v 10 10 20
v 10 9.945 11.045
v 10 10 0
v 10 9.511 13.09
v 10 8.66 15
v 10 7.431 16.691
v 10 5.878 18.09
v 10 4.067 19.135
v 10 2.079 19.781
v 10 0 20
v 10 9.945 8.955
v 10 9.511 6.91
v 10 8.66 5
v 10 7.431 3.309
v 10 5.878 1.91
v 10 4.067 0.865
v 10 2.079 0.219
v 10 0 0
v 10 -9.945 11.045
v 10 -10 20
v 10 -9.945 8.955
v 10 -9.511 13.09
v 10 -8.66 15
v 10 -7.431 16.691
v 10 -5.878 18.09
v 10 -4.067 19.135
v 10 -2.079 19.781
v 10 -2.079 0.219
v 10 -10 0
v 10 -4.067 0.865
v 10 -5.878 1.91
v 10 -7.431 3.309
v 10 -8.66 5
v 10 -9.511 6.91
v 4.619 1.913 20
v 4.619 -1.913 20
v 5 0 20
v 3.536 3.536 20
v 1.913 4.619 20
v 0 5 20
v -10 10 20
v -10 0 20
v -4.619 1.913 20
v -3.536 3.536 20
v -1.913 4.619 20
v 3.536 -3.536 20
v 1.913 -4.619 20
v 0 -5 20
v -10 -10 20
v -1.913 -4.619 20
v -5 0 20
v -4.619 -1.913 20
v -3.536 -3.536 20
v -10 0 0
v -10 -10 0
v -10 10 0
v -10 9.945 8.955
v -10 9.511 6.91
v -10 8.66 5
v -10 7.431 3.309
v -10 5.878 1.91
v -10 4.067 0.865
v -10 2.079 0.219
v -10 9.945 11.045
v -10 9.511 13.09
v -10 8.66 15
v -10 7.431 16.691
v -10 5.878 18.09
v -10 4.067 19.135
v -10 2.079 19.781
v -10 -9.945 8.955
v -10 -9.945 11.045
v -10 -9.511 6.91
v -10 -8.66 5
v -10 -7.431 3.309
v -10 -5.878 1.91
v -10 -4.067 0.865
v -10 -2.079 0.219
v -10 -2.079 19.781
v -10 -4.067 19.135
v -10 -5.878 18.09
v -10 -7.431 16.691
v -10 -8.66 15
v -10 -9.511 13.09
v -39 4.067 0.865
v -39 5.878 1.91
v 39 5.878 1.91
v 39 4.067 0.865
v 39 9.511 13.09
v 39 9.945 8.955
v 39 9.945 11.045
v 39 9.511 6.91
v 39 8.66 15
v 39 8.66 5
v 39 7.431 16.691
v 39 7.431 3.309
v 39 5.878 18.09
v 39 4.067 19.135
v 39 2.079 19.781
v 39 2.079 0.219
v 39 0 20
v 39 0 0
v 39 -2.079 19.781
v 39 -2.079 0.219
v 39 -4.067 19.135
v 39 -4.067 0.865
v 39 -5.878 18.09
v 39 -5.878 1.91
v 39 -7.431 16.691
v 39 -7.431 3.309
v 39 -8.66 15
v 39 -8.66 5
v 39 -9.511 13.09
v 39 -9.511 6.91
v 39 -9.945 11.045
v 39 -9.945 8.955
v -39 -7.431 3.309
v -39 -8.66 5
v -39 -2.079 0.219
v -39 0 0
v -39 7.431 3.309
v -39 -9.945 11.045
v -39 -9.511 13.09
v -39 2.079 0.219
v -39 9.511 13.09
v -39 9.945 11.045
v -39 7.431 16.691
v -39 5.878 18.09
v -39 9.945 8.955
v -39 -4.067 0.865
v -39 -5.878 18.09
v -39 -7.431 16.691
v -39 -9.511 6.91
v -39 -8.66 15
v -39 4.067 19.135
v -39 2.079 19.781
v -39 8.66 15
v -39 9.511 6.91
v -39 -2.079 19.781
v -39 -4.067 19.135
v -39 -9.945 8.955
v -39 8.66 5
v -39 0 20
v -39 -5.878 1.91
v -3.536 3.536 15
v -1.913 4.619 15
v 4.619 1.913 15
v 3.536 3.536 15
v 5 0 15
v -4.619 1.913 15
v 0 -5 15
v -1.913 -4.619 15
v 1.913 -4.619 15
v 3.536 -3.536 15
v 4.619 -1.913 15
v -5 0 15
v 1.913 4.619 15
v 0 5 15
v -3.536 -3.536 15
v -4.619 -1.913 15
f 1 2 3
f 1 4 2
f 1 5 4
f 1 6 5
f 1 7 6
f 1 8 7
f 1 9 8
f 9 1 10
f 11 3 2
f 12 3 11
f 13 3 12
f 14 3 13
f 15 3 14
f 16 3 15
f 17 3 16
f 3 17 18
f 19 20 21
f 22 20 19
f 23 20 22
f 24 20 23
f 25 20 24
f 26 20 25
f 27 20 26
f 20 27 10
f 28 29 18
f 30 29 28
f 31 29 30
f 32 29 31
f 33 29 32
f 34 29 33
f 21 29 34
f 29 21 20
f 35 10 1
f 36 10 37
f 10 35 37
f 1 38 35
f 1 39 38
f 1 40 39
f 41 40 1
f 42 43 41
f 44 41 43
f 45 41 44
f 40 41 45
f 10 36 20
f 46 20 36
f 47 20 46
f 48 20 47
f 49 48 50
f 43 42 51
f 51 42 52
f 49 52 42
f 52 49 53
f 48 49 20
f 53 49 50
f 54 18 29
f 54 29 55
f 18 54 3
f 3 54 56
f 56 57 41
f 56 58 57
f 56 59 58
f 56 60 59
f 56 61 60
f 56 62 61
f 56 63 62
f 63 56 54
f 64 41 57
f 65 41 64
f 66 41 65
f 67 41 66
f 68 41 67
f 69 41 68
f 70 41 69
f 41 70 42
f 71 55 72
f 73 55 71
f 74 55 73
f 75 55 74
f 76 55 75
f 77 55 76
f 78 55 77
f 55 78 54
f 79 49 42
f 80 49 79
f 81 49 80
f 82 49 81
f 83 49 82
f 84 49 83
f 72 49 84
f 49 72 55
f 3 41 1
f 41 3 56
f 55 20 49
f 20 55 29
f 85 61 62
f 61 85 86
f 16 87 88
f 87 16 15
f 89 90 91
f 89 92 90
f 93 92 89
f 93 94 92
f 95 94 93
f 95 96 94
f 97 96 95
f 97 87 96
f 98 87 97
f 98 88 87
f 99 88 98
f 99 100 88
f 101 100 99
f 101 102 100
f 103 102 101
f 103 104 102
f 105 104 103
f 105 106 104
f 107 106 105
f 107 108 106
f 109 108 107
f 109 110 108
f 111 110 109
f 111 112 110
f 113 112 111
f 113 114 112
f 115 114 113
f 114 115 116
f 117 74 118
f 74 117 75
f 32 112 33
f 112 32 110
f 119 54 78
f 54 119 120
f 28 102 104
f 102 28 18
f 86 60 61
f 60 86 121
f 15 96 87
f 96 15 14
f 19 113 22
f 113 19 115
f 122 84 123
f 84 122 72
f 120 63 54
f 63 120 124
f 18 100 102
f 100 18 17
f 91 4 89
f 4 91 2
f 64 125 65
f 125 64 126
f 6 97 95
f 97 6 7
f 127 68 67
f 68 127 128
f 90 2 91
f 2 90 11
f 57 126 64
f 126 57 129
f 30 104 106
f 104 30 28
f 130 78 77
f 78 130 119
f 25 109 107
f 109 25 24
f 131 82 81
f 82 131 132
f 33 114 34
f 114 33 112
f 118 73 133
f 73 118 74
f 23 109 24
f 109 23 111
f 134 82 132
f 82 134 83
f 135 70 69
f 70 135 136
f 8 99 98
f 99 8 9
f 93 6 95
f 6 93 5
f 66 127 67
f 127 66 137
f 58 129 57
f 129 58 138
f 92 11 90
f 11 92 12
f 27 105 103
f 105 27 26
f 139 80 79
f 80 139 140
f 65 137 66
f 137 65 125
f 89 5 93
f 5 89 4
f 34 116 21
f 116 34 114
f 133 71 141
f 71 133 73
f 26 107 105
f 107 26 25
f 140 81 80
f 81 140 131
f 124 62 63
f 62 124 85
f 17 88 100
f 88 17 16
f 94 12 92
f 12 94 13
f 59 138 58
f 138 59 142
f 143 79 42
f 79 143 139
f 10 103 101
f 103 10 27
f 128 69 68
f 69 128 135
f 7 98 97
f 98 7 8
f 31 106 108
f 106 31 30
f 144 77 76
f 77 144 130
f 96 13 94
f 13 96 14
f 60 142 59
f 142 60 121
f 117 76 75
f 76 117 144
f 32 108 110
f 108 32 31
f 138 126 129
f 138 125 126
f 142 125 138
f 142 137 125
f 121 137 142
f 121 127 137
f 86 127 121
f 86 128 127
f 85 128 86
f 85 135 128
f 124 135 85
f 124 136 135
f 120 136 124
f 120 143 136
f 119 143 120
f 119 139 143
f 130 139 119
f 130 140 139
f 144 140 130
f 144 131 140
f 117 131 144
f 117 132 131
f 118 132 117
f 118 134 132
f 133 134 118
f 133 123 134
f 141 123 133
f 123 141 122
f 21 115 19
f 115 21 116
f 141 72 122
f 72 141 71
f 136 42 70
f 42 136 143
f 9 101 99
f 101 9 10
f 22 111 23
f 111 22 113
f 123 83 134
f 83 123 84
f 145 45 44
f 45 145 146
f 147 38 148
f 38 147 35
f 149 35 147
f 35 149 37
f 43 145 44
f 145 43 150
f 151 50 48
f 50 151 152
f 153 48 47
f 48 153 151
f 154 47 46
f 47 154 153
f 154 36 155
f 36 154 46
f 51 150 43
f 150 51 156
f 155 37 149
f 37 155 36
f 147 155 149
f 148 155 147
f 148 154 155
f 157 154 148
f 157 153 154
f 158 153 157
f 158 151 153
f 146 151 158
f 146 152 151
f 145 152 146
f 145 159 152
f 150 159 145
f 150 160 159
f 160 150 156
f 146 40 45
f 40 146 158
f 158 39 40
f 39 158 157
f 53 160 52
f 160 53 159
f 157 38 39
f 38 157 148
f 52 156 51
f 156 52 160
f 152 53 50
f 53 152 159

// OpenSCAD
cube_size = 20; // [10:Small,20:Medium,30:Large]

hole_diameter = 10; 
hole_radius = hole_diameter/2;

// How deep should the center hole be?
hole_depth = 5; // [0,1,5,50]

show_wheels = "yes"; // [yes,no]

// How thick should the side wheels be?
wheel_thickness = 29; // [1:40]

// ignore this variable!
// foo=1;

// don't turn functions into params!
function BEZ03(u) = pow((1-u), 3);

// ignore variable values
bing = 3+4;
baz = 3 / hole_depth;

difference() {
  union() {
    translate([0, 0, cube_size/2]) cube([cube_size,cube_size,cube_size], center=true);
    if (show_wheels == "yes") {
      translate([0, 0, cube_size/2]) rotate([0, 90, 0]) {
        cylinder(r=cube_size/2, h=cube_size+(wheel_thickness*2), center=true);
      }
    }
  }
  translate([0, 0, cube_size-hole_depth]) cylinder(r=hole_radius, h=hole_depth);
}
        
